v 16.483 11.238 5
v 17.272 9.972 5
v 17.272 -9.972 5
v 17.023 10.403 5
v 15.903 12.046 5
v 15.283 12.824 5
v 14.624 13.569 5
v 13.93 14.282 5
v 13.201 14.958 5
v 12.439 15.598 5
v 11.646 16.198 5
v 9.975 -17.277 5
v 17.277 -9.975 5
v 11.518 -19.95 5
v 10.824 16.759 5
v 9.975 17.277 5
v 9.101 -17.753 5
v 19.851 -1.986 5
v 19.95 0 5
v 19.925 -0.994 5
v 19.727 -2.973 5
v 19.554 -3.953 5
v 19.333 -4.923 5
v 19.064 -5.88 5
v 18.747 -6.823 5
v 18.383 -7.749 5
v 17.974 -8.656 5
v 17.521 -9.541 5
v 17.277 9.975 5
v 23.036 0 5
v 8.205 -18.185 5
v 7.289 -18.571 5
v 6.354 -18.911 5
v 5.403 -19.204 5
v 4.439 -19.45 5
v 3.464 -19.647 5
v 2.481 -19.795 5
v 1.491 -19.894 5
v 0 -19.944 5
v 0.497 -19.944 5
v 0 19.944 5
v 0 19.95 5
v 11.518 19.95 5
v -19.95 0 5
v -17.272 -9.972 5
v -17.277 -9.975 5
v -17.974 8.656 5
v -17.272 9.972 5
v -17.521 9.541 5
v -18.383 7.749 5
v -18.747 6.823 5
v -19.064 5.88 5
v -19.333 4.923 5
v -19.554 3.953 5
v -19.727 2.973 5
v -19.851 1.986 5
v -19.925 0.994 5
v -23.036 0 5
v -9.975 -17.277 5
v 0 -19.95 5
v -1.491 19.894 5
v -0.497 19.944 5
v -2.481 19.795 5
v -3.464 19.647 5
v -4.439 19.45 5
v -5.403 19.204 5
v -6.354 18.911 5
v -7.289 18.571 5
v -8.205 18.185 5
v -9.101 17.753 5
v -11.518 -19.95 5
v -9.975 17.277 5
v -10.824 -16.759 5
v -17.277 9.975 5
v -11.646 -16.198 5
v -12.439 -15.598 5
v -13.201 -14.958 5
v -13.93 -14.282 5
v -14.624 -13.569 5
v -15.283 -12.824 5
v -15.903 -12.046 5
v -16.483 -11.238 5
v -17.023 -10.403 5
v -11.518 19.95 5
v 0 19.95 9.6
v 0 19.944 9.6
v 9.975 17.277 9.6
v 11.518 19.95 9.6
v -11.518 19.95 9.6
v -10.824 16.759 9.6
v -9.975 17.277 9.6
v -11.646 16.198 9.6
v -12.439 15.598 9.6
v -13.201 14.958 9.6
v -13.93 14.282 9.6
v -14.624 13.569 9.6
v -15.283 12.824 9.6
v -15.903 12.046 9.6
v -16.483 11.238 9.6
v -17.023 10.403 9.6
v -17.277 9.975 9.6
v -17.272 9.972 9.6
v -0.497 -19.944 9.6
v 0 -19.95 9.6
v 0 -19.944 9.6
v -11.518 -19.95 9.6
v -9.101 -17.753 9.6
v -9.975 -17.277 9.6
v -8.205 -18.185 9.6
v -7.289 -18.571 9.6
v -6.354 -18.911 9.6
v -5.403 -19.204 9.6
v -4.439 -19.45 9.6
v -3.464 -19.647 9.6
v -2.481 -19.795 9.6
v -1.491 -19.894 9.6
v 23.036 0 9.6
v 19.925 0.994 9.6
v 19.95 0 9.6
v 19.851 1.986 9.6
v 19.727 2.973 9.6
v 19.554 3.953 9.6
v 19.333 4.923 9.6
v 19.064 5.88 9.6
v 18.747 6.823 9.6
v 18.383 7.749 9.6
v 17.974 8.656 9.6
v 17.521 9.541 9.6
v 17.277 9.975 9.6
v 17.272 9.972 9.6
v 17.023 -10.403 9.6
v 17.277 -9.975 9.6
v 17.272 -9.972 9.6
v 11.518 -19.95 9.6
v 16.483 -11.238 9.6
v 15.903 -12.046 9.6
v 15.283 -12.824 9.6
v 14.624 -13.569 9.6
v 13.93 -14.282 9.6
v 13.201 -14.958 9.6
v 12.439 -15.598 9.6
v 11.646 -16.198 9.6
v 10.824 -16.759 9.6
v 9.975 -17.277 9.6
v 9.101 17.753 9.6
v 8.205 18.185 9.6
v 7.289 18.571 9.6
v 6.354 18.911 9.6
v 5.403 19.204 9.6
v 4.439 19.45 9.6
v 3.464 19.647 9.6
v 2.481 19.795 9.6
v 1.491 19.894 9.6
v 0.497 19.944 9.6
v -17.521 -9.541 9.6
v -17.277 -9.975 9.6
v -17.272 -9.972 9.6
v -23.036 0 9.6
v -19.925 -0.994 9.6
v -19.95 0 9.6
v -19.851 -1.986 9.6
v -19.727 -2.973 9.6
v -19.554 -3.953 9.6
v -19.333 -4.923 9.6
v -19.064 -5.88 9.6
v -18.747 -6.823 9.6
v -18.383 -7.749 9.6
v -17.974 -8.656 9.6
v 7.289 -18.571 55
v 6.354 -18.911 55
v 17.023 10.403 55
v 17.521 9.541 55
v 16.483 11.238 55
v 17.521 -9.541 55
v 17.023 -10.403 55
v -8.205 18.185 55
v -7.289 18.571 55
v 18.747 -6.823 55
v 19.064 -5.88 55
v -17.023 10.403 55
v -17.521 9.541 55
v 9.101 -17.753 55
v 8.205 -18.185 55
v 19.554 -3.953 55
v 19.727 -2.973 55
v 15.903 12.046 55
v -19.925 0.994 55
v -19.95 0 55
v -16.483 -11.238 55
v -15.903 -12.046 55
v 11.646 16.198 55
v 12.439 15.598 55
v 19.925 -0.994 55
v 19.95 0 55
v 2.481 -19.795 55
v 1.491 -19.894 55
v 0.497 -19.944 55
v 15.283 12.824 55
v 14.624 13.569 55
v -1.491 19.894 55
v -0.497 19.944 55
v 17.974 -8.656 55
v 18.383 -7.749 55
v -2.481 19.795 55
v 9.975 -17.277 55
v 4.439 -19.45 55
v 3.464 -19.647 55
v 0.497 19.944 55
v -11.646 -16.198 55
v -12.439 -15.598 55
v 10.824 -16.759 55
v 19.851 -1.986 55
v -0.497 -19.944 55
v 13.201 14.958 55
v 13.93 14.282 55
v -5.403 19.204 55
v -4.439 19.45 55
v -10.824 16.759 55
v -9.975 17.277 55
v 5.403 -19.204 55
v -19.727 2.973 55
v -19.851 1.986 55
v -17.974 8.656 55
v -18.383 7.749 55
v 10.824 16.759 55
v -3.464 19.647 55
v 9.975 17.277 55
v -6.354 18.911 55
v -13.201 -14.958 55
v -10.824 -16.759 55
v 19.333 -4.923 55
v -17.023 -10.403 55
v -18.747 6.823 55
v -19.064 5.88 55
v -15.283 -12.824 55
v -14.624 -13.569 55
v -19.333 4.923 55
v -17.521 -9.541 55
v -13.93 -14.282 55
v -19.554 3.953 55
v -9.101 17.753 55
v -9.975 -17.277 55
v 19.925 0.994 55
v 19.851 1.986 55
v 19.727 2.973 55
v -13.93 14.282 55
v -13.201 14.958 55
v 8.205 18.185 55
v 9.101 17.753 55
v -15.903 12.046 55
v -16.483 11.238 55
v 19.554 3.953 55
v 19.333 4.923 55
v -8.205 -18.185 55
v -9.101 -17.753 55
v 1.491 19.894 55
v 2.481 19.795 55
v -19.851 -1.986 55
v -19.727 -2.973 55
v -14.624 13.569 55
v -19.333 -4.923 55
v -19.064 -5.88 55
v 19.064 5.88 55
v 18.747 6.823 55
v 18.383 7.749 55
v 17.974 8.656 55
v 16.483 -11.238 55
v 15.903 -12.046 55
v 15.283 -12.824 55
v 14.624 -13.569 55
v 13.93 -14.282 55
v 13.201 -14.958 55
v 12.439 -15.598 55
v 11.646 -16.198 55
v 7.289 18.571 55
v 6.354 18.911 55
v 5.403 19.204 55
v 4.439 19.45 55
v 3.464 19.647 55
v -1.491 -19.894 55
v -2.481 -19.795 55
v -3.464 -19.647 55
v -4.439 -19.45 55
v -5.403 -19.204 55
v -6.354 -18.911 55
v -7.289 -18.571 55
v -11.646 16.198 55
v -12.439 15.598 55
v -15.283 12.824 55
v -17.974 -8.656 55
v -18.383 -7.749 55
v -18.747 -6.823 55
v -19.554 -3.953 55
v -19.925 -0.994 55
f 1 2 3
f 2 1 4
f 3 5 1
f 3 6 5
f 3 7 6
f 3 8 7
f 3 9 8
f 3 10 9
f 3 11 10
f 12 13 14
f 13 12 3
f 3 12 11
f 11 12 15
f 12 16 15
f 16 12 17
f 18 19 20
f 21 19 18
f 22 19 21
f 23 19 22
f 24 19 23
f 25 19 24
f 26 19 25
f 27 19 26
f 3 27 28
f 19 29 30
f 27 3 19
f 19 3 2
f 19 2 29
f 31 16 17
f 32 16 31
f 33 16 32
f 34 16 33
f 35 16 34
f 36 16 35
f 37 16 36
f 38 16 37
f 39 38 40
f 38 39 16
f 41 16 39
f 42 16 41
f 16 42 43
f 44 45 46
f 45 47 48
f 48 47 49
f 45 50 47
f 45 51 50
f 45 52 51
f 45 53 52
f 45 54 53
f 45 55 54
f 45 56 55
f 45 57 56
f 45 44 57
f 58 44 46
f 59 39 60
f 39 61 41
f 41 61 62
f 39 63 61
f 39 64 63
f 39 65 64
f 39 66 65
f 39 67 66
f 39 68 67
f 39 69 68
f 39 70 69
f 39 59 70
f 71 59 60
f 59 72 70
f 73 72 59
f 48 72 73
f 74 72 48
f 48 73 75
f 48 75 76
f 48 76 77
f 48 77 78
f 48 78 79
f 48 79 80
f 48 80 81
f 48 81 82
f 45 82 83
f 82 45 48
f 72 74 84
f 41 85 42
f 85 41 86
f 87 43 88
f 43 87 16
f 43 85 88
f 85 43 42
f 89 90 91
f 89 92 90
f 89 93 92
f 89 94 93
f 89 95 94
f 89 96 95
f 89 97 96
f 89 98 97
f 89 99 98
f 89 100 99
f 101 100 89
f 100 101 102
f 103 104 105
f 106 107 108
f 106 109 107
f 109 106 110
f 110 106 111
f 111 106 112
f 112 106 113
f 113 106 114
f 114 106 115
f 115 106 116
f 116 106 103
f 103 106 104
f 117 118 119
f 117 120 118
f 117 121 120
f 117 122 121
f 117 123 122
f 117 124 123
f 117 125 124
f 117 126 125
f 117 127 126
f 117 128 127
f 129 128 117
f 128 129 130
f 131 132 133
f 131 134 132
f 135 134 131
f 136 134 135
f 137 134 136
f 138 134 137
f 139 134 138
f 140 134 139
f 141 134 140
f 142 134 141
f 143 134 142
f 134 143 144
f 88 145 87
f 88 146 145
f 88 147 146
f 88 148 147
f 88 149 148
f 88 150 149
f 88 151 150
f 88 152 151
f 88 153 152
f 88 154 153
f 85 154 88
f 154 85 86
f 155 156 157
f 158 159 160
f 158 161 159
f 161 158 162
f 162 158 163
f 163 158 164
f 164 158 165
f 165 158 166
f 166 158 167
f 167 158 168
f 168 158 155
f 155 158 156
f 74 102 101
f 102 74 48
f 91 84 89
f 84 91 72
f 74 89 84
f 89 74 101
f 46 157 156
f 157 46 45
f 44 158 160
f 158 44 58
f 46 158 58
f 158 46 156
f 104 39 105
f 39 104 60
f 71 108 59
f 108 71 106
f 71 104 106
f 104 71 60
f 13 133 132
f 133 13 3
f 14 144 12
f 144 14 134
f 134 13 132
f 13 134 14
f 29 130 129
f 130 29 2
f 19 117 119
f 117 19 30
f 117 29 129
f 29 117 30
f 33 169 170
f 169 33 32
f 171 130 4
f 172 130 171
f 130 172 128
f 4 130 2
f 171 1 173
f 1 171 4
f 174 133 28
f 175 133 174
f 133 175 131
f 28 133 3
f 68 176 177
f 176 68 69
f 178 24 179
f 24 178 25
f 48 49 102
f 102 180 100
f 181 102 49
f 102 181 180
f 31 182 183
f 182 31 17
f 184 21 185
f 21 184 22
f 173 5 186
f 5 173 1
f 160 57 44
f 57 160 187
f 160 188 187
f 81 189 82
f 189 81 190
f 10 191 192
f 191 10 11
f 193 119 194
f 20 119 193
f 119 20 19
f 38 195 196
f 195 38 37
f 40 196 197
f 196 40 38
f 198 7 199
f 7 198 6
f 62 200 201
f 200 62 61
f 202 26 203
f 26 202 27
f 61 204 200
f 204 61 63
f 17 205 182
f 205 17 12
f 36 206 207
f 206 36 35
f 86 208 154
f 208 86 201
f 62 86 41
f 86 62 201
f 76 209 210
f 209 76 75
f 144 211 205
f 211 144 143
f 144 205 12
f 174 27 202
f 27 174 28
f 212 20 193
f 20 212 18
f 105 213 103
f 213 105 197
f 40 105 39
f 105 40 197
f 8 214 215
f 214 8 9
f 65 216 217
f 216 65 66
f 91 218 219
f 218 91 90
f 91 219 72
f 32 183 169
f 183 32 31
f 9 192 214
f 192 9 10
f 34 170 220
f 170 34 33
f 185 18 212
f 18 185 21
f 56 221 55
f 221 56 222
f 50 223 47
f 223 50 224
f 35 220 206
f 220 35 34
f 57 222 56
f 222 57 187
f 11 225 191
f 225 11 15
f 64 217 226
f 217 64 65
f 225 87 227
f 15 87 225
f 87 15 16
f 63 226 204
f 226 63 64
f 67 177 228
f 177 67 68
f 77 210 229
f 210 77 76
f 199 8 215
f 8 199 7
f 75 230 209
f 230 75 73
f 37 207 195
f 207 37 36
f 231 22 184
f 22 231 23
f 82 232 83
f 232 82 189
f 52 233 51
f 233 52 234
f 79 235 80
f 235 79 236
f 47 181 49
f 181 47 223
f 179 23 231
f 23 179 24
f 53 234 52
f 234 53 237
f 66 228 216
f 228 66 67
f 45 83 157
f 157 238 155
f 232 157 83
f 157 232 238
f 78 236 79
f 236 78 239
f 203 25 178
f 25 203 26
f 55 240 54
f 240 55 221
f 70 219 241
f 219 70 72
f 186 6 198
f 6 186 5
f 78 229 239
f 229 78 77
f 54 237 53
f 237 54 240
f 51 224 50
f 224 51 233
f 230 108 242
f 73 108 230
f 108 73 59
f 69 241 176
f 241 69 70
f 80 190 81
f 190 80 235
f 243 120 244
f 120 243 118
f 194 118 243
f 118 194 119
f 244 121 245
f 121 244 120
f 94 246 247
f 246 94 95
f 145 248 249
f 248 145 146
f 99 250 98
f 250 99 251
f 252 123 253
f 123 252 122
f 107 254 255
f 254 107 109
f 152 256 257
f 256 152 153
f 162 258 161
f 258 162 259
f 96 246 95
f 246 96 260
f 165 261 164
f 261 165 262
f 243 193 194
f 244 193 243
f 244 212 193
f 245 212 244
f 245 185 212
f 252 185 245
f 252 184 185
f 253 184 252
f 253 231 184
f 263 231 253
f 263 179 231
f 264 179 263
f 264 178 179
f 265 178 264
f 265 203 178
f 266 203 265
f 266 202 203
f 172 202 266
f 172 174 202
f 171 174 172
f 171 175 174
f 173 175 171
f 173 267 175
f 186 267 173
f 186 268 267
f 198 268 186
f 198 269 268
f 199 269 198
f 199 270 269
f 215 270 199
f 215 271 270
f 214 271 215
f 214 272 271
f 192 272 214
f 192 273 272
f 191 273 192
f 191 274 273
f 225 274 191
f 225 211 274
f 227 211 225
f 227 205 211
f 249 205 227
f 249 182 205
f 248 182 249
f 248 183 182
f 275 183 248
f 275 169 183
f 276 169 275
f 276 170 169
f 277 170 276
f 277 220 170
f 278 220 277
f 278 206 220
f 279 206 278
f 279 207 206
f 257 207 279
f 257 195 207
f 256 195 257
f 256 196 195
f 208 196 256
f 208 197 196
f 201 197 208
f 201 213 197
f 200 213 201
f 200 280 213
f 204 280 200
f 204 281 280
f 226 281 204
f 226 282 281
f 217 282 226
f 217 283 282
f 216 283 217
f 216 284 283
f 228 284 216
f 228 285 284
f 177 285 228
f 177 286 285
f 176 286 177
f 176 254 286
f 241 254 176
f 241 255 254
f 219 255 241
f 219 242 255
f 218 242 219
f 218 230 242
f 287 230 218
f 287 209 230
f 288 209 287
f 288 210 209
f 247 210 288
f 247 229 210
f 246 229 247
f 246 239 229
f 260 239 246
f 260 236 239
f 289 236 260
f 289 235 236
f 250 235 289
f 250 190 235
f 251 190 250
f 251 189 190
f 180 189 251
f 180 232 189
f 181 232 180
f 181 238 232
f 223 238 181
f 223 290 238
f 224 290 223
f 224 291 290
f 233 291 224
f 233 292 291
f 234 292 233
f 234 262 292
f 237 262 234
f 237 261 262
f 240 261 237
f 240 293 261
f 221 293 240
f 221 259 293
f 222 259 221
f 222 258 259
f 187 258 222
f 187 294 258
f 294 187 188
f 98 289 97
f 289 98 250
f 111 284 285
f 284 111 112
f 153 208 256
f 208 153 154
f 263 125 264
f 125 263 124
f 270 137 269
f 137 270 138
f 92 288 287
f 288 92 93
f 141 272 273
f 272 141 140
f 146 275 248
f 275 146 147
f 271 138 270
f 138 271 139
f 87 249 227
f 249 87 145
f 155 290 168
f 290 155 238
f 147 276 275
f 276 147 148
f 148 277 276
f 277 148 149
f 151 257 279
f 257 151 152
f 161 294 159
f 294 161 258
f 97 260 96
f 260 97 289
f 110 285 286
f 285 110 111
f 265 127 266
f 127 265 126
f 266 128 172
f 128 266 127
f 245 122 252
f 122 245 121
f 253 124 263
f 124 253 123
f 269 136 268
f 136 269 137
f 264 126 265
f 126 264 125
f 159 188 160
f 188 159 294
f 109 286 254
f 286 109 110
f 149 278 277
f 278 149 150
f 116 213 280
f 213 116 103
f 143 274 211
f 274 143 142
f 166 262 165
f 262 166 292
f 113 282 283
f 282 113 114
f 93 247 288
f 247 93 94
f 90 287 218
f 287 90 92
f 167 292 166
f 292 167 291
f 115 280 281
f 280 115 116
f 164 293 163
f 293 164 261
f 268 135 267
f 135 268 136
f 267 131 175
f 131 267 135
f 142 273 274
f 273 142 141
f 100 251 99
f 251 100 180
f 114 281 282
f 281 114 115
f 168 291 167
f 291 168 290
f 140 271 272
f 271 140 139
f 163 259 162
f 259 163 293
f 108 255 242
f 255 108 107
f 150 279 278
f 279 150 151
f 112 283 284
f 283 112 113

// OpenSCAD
$fa=.01;
$fs=1;
// bottle outer diameter must be an overapproximation!
bottle_od = 40.3;
// fillet radius must be an underapproximation!
bottle_fillet_r = 5;

count=6;
spacing=5;

angle=360/count;
halfangle=angle/2;

hex_correction = 1/cos(30);

module bottle(hex=false){
    translate([0,0,bottle_fillet_r]) minkowski() {
        sphere(r = bottle_fillet_r);
        if(hex){
            rotate([0,0,30]) cylinder(h = 70 - 2 * bottle_fillet_r, d = hex_correction*(bottle_od - 2 * bottle_fillet_r), $fn=6);
        } else {
            cylinder(h = 70 - 2 * bottle_fillet_r, d = bottle_od - 2 * bottle_fillet_r);
        }
    }
        cylinder(d=25,h=85);
        cylinder(d=7,h=105);
}


module neg(bot=true){
    if(bot) %bottle();
    rotate([0,0,30]) cylinder(d=hex_correction*bottle_od, h=40, $fn=6);
    for(i=[0:5]){
        rotate([0,0,i*angle]) translate([bottle_od+spacing,0,0]) {
            if(bot) %bottle(hex=false);
            rotate([0,0,30]) cylinder(d=hex_correction*bottle_od, h=40, $fn=6);
        }
    }
}



module main(){
    difference(){
        minkowski(){
            neg();
            cylinder(r1=0, r2=spacing, h=spacing);
        }
        translate([0,0,spacing]) spikee(d=bottle_od, h=5);
        translate([0,0,spacing]) scale([1,1,2]) neg(bot=false);
    }
}

module spiker(d, h){
    for(i=[0:5]) rotate(60*i) intersection(){
        cube(999);
        rotate([0,0,60]) cube(999);
        cylinder(d=hex_correction*d, h=h, $fn=6);
    }
    cylinder(d=d, h=h);
}


module spikee(d, h) mirror([0,1,0]) rotate([0,0,30]){
    for(i=[0:5]) rotate(60*i) intersection(){
        cube(999);
        rotate([0,0,60]) cube(999);
        cylinder(d=hex_correction*d, h=h);
    }
    cylinder(d=hex_correction*d, h=h, $fn=6);
}

module column(){
    translate([0,0,spacing]) spiker(d=bottle_od-.4, h=spacing-.4);
    translate([0,0,spacing]) cylinder(d=bottle_od-.4, h=50);
}

module testmain(){
    difference(){
        minkowski(){
            rotate([0,0,30]) cylinder(d=hex_correction*bottle_od, h=10, $fn=6);
            cylinder(r1=0, r2=spacing, h=spacing);
        }
        translate([0,0,spacing]) spikee(d=bottle_od, h=spacing);
        translate([0,0,spacing]) scale([1,1,2]) rotate([0,0,30]) cylinder(d=hex_correction*bottle_od, h=40, $fn=6);
    }
}


module testcolumn(){
    translate([0,0,spacing]) spiker(d=bottle_od-.4, h=spacing-.4);
    translate([0,0,spacing]) cylinder(d=bottle_od-.4, h=spacing*2);
    translate([0,0,spacing*3]) cube([bottle_od/2,spacing,spacing*2], center=true);
}

column();

//color("red")translate([0,0,20]) column();
